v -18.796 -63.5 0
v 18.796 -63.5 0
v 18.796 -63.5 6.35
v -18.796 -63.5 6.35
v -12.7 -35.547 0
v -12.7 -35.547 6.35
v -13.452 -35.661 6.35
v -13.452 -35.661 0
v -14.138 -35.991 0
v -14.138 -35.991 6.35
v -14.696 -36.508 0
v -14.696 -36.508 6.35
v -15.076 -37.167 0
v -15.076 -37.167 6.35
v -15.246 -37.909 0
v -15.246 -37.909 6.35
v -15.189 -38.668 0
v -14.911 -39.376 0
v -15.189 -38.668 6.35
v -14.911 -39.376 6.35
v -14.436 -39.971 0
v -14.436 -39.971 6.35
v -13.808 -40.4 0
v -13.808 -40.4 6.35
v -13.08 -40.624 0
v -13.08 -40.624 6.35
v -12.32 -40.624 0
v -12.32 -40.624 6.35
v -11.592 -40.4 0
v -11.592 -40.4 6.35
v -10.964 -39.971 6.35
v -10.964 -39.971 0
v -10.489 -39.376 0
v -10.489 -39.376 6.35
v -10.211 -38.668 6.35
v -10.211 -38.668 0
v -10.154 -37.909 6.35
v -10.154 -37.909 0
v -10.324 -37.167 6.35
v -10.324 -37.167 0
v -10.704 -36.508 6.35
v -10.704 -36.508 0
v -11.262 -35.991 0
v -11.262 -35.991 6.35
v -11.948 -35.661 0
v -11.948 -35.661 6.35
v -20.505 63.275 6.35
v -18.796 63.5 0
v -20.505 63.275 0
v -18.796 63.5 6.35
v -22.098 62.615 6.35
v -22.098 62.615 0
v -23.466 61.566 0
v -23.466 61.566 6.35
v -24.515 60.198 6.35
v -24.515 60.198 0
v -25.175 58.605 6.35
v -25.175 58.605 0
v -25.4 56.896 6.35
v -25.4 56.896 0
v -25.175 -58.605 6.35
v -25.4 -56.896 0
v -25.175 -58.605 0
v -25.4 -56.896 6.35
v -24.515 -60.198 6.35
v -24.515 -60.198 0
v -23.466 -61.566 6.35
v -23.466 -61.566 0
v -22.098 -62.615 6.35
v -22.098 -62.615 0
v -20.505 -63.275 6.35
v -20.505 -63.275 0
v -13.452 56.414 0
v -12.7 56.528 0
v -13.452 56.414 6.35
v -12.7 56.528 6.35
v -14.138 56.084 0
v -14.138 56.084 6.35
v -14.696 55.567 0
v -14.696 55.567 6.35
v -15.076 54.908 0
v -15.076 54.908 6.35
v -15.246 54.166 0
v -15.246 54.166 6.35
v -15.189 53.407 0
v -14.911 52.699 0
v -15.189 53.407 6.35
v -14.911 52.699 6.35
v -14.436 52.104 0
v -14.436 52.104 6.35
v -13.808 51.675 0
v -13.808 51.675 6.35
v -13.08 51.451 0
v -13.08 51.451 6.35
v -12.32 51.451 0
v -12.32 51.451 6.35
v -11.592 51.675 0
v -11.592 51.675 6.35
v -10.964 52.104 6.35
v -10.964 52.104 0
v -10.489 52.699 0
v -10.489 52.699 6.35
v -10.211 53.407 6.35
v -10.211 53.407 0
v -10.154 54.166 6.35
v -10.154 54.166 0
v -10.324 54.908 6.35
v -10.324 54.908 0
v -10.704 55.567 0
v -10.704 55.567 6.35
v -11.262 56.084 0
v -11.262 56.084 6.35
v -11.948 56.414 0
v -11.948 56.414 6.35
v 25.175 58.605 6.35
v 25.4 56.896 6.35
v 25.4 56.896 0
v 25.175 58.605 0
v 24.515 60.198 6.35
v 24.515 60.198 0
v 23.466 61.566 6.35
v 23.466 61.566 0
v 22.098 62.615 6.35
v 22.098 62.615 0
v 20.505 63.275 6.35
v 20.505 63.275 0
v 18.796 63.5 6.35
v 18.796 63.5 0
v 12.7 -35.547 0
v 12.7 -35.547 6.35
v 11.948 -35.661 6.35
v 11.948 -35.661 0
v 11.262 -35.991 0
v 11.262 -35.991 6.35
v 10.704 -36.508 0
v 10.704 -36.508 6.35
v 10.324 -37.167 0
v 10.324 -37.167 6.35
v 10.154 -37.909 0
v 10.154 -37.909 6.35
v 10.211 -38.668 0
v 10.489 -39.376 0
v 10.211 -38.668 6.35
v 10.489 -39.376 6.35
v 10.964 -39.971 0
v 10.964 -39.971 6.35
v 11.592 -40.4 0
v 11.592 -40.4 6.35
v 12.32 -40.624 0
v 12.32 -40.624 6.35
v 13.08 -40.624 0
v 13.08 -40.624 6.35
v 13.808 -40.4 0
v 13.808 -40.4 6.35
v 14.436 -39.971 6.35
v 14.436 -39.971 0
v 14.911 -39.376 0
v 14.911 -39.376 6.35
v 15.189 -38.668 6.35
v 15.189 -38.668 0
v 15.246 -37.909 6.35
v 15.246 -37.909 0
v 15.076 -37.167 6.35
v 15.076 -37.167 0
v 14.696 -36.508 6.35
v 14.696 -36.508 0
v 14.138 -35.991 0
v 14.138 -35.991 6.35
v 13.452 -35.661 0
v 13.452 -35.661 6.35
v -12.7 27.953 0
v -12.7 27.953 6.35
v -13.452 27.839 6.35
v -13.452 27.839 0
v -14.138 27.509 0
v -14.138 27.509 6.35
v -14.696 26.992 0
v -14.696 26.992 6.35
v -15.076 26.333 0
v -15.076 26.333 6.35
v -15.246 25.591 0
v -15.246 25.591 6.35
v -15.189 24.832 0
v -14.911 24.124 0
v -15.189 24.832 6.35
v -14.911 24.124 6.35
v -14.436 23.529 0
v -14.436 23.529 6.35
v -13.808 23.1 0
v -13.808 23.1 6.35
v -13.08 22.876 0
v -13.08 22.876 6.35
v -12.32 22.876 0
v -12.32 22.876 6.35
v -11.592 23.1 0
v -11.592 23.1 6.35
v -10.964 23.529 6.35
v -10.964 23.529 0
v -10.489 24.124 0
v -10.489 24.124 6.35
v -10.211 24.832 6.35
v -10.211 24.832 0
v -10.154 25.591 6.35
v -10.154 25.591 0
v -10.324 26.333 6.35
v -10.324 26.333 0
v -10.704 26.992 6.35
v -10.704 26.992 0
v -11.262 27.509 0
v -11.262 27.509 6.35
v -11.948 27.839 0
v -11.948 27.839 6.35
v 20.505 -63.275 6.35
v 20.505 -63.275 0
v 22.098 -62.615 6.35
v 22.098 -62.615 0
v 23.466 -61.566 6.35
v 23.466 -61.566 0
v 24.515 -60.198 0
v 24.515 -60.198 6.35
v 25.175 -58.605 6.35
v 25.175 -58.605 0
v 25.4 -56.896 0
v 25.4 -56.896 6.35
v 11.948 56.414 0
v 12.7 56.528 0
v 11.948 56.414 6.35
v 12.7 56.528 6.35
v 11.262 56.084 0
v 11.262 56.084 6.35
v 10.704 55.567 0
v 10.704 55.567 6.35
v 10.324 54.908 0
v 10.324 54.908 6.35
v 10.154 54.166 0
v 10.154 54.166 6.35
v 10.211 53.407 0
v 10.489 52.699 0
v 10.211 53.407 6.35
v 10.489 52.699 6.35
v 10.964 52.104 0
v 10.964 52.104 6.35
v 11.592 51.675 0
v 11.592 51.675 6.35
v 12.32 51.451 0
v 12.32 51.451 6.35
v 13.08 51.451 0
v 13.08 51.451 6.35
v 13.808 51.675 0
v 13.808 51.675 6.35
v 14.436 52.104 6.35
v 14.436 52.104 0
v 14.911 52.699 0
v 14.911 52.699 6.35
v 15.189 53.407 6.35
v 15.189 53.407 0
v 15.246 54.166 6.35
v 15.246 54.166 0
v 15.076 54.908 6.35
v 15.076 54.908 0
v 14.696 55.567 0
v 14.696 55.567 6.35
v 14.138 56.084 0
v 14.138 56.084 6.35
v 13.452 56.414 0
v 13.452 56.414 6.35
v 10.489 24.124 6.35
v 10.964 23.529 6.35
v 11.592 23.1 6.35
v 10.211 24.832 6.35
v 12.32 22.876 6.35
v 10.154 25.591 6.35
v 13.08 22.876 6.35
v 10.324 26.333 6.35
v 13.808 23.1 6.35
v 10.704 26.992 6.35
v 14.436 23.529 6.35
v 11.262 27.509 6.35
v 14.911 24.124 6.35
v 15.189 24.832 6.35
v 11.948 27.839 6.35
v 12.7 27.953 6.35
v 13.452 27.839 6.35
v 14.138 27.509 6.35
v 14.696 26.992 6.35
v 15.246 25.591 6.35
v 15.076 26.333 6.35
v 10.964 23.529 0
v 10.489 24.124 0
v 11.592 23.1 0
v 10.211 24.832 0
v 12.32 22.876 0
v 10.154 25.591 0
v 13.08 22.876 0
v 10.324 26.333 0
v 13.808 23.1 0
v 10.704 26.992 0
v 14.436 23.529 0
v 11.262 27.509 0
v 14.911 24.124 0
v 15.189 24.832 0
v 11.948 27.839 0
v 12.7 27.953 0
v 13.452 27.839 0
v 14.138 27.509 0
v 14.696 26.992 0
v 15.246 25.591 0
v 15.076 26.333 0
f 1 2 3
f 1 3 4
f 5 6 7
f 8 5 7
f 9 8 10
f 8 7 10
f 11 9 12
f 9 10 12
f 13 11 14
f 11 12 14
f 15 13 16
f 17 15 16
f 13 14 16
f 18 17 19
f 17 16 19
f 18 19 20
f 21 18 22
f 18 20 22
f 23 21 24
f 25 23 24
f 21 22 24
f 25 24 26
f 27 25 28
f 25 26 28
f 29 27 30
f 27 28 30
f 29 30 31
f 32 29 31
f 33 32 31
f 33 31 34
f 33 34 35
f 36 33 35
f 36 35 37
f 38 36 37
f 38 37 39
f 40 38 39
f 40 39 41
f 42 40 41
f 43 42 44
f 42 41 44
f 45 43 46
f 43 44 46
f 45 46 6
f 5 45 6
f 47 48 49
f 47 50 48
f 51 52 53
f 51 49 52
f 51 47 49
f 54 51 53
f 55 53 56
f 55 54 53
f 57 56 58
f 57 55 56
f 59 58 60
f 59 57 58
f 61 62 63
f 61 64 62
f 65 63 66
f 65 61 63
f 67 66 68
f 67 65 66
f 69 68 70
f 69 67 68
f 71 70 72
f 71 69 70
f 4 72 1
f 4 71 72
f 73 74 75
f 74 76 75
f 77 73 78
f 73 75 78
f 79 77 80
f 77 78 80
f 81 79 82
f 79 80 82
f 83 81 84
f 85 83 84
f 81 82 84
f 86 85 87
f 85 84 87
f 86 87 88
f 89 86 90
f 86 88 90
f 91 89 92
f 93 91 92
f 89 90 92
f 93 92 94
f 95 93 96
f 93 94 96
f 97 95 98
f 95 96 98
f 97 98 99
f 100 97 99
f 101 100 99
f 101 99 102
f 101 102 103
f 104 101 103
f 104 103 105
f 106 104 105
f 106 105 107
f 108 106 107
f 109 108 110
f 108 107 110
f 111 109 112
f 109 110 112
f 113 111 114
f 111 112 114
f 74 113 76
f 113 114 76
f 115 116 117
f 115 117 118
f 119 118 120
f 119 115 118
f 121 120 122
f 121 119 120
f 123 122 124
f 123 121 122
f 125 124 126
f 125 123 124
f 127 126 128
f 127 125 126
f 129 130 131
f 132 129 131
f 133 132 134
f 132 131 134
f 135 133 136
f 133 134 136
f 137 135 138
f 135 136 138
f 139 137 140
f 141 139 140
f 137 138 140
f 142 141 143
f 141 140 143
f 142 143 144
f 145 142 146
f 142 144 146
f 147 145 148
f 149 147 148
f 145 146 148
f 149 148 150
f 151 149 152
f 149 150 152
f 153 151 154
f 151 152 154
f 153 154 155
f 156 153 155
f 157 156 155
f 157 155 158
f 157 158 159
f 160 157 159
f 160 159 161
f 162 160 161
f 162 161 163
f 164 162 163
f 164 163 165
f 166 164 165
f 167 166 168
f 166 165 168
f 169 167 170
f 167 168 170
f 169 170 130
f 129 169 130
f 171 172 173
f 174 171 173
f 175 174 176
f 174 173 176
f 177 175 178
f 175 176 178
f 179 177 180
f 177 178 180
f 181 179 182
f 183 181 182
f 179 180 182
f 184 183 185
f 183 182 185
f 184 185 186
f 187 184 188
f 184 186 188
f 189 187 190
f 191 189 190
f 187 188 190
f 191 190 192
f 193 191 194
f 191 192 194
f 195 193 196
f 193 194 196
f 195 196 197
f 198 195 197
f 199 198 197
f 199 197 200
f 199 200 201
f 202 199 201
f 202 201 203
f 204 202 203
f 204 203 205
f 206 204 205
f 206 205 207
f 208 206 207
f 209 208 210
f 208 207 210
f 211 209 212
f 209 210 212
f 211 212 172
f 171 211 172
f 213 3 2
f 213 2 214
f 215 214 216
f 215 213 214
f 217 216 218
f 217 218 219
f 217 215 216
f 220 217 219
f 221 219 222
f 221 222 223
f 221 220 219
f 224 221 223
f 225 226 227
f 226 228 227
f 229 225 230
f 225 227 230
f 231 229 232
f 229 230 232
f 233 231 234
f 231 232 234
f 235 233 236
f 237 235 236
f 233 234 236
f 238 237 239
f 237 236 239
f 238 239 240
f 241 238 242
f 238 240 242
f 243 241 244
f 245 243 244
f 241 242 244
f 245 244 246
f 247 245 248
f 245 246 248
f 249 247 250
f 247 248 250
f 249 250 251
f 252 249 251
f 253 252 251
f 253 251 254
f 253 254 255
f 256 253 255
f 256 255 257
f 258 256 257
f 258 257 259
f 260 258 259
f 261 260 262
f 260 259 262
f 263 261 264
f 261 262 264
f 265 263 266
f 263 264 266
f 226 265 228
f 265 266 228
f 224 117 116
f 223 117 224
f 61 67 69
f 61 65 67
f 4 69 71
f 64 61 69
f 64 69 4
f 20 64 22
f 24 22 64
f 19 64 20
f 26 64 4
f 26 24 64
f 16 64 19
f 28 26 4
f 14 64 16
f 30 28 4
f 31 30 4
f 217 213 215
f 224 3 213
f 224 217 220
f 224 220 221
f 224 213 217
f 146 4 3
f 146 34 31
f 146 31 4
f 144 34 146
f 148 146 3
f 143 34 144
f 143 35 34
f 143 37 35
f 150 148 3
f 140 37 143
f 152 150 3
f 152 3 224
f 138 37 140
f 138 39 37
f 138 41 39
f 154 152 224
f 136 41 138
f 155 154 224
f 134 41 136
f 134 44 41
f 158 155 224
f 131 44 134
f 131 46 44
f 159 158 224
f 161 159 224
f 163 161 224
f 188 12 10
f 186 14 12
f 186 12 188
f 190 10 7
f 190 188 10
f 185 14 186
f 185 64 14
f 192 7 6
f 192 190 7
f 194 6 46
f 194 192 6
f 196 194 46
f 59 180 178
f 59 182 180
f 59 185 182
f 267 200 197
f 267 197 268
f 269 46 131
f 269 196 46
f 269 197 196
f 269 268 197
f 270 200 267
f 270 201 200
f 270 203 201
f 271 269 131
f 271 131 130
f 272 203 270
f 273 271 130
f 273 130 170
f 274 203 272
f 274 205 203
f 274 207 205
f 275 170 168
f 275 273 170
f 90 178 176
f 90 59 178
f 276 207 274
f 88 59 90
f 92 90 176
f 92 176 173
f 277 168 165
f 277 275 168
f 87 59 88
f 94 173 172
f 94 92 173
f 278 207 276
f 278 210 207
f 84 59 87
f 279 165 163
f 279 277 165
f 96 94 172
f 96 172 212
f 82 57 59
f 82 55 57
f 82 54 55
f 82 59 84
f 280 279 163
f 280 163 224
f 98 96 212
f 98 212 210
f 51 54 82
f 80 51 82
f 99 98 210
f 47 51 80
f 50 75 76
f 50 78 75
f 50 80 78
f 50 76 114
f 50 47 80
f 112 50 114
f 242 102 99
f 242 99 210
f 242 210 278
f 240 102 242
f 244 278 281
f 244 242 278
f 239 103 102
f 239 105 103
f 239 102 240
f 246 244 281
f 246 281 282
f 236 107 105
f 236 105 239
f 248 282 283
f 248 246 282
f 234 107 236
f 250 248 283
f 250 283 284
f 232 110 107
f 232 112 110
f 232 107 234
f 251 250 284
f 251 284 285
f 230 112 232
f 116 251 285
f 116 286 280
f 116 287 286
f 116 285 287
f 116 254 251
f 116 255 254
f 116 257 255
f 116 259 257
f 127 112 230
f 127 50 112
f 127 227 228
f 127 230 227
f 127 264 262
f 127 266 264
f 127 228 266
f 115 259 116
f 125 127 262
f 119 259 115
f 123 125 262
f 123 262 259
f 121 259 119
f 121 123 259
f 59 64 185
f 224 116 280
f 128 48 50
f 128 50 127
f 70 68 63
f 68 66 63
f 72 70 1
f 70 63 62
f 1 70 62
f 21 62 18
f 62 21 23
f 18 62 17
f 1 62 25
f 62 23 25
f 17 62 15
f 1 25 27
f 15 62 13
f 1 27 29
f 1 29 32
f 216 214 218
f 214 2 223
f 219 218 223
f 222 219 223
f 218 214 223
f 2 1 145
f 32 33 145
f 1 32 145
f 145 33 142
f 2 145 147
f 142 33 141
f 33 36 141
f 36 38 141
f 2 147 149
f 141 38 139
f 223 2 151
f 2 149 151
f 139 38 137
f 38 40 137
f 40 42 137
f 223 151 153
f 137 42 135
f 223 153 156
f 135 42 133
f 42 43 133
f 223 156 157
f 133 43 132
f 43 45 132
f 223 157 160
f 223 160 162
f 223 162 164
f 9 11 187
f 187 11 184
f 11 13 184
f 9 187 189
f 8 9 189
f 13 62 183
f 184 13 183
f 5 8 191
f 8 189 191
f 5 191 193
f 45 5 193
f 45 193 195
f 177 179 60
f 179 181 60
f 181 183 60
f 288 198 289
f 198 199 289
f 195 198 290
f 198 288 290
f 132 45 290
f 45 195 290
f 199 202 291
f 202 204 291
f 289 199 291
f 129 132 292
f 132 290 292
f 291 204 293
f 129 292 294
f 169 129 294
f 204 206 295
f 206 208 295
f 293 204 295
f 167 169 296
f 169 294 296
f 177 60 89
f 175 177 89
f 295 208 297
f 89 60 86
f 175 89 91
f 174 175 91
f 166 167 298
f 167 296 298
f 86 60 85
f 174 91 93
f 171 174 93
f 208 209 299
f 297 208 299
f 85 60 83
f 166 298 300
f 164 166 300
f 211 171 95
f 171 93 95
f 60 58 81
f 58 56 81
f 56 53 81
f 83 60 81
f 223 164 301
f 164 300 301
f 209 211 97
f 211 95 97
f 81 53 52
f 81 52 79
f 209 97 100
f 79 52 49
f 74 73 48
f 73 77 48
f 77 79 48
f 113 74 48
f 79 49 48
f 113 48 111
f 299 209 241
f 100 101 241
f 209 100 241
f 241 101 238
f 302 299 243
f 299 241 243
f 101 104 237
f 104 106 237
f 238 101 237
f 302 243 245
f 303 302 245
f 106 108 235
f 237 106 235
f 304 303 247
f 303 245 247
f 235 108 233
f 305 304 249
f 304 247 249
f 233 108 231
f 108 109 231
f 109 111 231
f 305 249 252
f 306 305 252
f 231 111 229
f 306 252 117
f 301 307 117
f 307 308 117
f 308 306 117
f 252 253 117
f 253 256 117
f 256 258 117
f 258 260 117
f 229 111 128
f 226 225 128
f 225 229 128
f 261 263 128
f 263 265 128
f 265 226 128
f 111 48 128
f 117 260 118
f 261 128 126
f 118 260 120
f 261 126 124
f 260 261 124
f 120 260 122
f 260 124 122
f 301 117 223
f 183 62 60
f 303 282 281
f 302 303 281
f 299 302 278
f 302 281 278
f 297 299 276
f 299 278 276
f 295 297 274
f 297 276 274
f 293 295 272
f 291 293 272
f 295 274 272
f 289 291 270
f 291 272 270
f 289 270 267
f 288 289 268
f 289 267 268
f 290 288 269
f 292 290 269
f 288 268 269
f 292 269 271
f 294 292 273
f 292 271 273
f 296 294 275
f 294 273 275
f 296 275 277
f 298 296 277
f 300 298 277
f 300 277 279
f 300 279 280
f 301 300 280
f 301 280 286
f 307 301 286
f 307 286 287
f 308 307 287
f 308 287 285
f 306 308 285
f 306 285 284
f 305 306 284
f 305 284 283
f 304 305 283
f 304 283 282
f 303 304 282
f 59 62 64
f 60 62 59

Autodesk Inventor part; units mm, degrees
ref_plane "YZ Plane" through (0, 0, 0) normal (1, 0, 0) x (0, 1, 0)
ref_plane "XZ Plane" through (0, 0, 0) normal (0, 1, 0) x (-1, 0, 0)
ref_plane "XY Plane" through (0, 0, 0) normal (0, 0, 1) x (1, 0, 0)
sketch "Sketch1" plane through (0, 0, 0) normal (0, 0, 1) x (1, 0, 0)
  line L0 (25.4, -63.5) -> (-25.4, -63.5)
  line L1 (-25.4, -63.5) -> (-25.4, 63.5)
  line L2 (-25.4, 63.5) -> (25.4, 63.5)
  line L3 (25.4, 63.5) -> (25.4, -63.5)
  line L4 (25.4, -63.5) -> (-25.4, 63.5) construction
  line L5 (-25.4, -63.5) -> (25.4, 63.5) construction
  line L6 (-12.7, 53.975) -> (12.7, 53.975) construction
  point P0 (0, 0)
  point P1 (-12.7, 25.4)
  point P2 (12.7, 25.4)
  point P3 (12.7, -38.1)
  point P4 (-12.7, -38.1)
  point P5 (0, 53.975)
  point P6 (0, 63.5)
  dimension "d0" = 50.8
  dimension "d1" = 127
  dimension "d2" = 9.525
  dimension "d3" = 25.4
  dimension "d4" = 38.1
  dimension "d5" = 63.5
extrude "Extrusion1" add sketch "Sketch1" along normal blind 6.35
hole "Hole1" at (-12.7, 53.975, 0) at (12.7, 53.975, 0) at (-12.7, 25.4, 0) at (12.7, 25.4, 0) at (12.7, -38.1, 0) at (-12.7, -38.1, 0) direction (0, 0, 1) diameter 5.1054 end through all clearance for "Flat Head Machine Screw (82)" size "#10" standard "Ansi Unified Screw Threads"
fillet "Fillet1" radius 6.604 4 edges at (25.4, 63.5, 3.175) (-25.4, 63.5, 3.175) (25.4, -63.5, 3.175) (-25.4, -63.5, 3.175)
properties part number "CL7-GB-003" material "Polycarbonate, Clear"
